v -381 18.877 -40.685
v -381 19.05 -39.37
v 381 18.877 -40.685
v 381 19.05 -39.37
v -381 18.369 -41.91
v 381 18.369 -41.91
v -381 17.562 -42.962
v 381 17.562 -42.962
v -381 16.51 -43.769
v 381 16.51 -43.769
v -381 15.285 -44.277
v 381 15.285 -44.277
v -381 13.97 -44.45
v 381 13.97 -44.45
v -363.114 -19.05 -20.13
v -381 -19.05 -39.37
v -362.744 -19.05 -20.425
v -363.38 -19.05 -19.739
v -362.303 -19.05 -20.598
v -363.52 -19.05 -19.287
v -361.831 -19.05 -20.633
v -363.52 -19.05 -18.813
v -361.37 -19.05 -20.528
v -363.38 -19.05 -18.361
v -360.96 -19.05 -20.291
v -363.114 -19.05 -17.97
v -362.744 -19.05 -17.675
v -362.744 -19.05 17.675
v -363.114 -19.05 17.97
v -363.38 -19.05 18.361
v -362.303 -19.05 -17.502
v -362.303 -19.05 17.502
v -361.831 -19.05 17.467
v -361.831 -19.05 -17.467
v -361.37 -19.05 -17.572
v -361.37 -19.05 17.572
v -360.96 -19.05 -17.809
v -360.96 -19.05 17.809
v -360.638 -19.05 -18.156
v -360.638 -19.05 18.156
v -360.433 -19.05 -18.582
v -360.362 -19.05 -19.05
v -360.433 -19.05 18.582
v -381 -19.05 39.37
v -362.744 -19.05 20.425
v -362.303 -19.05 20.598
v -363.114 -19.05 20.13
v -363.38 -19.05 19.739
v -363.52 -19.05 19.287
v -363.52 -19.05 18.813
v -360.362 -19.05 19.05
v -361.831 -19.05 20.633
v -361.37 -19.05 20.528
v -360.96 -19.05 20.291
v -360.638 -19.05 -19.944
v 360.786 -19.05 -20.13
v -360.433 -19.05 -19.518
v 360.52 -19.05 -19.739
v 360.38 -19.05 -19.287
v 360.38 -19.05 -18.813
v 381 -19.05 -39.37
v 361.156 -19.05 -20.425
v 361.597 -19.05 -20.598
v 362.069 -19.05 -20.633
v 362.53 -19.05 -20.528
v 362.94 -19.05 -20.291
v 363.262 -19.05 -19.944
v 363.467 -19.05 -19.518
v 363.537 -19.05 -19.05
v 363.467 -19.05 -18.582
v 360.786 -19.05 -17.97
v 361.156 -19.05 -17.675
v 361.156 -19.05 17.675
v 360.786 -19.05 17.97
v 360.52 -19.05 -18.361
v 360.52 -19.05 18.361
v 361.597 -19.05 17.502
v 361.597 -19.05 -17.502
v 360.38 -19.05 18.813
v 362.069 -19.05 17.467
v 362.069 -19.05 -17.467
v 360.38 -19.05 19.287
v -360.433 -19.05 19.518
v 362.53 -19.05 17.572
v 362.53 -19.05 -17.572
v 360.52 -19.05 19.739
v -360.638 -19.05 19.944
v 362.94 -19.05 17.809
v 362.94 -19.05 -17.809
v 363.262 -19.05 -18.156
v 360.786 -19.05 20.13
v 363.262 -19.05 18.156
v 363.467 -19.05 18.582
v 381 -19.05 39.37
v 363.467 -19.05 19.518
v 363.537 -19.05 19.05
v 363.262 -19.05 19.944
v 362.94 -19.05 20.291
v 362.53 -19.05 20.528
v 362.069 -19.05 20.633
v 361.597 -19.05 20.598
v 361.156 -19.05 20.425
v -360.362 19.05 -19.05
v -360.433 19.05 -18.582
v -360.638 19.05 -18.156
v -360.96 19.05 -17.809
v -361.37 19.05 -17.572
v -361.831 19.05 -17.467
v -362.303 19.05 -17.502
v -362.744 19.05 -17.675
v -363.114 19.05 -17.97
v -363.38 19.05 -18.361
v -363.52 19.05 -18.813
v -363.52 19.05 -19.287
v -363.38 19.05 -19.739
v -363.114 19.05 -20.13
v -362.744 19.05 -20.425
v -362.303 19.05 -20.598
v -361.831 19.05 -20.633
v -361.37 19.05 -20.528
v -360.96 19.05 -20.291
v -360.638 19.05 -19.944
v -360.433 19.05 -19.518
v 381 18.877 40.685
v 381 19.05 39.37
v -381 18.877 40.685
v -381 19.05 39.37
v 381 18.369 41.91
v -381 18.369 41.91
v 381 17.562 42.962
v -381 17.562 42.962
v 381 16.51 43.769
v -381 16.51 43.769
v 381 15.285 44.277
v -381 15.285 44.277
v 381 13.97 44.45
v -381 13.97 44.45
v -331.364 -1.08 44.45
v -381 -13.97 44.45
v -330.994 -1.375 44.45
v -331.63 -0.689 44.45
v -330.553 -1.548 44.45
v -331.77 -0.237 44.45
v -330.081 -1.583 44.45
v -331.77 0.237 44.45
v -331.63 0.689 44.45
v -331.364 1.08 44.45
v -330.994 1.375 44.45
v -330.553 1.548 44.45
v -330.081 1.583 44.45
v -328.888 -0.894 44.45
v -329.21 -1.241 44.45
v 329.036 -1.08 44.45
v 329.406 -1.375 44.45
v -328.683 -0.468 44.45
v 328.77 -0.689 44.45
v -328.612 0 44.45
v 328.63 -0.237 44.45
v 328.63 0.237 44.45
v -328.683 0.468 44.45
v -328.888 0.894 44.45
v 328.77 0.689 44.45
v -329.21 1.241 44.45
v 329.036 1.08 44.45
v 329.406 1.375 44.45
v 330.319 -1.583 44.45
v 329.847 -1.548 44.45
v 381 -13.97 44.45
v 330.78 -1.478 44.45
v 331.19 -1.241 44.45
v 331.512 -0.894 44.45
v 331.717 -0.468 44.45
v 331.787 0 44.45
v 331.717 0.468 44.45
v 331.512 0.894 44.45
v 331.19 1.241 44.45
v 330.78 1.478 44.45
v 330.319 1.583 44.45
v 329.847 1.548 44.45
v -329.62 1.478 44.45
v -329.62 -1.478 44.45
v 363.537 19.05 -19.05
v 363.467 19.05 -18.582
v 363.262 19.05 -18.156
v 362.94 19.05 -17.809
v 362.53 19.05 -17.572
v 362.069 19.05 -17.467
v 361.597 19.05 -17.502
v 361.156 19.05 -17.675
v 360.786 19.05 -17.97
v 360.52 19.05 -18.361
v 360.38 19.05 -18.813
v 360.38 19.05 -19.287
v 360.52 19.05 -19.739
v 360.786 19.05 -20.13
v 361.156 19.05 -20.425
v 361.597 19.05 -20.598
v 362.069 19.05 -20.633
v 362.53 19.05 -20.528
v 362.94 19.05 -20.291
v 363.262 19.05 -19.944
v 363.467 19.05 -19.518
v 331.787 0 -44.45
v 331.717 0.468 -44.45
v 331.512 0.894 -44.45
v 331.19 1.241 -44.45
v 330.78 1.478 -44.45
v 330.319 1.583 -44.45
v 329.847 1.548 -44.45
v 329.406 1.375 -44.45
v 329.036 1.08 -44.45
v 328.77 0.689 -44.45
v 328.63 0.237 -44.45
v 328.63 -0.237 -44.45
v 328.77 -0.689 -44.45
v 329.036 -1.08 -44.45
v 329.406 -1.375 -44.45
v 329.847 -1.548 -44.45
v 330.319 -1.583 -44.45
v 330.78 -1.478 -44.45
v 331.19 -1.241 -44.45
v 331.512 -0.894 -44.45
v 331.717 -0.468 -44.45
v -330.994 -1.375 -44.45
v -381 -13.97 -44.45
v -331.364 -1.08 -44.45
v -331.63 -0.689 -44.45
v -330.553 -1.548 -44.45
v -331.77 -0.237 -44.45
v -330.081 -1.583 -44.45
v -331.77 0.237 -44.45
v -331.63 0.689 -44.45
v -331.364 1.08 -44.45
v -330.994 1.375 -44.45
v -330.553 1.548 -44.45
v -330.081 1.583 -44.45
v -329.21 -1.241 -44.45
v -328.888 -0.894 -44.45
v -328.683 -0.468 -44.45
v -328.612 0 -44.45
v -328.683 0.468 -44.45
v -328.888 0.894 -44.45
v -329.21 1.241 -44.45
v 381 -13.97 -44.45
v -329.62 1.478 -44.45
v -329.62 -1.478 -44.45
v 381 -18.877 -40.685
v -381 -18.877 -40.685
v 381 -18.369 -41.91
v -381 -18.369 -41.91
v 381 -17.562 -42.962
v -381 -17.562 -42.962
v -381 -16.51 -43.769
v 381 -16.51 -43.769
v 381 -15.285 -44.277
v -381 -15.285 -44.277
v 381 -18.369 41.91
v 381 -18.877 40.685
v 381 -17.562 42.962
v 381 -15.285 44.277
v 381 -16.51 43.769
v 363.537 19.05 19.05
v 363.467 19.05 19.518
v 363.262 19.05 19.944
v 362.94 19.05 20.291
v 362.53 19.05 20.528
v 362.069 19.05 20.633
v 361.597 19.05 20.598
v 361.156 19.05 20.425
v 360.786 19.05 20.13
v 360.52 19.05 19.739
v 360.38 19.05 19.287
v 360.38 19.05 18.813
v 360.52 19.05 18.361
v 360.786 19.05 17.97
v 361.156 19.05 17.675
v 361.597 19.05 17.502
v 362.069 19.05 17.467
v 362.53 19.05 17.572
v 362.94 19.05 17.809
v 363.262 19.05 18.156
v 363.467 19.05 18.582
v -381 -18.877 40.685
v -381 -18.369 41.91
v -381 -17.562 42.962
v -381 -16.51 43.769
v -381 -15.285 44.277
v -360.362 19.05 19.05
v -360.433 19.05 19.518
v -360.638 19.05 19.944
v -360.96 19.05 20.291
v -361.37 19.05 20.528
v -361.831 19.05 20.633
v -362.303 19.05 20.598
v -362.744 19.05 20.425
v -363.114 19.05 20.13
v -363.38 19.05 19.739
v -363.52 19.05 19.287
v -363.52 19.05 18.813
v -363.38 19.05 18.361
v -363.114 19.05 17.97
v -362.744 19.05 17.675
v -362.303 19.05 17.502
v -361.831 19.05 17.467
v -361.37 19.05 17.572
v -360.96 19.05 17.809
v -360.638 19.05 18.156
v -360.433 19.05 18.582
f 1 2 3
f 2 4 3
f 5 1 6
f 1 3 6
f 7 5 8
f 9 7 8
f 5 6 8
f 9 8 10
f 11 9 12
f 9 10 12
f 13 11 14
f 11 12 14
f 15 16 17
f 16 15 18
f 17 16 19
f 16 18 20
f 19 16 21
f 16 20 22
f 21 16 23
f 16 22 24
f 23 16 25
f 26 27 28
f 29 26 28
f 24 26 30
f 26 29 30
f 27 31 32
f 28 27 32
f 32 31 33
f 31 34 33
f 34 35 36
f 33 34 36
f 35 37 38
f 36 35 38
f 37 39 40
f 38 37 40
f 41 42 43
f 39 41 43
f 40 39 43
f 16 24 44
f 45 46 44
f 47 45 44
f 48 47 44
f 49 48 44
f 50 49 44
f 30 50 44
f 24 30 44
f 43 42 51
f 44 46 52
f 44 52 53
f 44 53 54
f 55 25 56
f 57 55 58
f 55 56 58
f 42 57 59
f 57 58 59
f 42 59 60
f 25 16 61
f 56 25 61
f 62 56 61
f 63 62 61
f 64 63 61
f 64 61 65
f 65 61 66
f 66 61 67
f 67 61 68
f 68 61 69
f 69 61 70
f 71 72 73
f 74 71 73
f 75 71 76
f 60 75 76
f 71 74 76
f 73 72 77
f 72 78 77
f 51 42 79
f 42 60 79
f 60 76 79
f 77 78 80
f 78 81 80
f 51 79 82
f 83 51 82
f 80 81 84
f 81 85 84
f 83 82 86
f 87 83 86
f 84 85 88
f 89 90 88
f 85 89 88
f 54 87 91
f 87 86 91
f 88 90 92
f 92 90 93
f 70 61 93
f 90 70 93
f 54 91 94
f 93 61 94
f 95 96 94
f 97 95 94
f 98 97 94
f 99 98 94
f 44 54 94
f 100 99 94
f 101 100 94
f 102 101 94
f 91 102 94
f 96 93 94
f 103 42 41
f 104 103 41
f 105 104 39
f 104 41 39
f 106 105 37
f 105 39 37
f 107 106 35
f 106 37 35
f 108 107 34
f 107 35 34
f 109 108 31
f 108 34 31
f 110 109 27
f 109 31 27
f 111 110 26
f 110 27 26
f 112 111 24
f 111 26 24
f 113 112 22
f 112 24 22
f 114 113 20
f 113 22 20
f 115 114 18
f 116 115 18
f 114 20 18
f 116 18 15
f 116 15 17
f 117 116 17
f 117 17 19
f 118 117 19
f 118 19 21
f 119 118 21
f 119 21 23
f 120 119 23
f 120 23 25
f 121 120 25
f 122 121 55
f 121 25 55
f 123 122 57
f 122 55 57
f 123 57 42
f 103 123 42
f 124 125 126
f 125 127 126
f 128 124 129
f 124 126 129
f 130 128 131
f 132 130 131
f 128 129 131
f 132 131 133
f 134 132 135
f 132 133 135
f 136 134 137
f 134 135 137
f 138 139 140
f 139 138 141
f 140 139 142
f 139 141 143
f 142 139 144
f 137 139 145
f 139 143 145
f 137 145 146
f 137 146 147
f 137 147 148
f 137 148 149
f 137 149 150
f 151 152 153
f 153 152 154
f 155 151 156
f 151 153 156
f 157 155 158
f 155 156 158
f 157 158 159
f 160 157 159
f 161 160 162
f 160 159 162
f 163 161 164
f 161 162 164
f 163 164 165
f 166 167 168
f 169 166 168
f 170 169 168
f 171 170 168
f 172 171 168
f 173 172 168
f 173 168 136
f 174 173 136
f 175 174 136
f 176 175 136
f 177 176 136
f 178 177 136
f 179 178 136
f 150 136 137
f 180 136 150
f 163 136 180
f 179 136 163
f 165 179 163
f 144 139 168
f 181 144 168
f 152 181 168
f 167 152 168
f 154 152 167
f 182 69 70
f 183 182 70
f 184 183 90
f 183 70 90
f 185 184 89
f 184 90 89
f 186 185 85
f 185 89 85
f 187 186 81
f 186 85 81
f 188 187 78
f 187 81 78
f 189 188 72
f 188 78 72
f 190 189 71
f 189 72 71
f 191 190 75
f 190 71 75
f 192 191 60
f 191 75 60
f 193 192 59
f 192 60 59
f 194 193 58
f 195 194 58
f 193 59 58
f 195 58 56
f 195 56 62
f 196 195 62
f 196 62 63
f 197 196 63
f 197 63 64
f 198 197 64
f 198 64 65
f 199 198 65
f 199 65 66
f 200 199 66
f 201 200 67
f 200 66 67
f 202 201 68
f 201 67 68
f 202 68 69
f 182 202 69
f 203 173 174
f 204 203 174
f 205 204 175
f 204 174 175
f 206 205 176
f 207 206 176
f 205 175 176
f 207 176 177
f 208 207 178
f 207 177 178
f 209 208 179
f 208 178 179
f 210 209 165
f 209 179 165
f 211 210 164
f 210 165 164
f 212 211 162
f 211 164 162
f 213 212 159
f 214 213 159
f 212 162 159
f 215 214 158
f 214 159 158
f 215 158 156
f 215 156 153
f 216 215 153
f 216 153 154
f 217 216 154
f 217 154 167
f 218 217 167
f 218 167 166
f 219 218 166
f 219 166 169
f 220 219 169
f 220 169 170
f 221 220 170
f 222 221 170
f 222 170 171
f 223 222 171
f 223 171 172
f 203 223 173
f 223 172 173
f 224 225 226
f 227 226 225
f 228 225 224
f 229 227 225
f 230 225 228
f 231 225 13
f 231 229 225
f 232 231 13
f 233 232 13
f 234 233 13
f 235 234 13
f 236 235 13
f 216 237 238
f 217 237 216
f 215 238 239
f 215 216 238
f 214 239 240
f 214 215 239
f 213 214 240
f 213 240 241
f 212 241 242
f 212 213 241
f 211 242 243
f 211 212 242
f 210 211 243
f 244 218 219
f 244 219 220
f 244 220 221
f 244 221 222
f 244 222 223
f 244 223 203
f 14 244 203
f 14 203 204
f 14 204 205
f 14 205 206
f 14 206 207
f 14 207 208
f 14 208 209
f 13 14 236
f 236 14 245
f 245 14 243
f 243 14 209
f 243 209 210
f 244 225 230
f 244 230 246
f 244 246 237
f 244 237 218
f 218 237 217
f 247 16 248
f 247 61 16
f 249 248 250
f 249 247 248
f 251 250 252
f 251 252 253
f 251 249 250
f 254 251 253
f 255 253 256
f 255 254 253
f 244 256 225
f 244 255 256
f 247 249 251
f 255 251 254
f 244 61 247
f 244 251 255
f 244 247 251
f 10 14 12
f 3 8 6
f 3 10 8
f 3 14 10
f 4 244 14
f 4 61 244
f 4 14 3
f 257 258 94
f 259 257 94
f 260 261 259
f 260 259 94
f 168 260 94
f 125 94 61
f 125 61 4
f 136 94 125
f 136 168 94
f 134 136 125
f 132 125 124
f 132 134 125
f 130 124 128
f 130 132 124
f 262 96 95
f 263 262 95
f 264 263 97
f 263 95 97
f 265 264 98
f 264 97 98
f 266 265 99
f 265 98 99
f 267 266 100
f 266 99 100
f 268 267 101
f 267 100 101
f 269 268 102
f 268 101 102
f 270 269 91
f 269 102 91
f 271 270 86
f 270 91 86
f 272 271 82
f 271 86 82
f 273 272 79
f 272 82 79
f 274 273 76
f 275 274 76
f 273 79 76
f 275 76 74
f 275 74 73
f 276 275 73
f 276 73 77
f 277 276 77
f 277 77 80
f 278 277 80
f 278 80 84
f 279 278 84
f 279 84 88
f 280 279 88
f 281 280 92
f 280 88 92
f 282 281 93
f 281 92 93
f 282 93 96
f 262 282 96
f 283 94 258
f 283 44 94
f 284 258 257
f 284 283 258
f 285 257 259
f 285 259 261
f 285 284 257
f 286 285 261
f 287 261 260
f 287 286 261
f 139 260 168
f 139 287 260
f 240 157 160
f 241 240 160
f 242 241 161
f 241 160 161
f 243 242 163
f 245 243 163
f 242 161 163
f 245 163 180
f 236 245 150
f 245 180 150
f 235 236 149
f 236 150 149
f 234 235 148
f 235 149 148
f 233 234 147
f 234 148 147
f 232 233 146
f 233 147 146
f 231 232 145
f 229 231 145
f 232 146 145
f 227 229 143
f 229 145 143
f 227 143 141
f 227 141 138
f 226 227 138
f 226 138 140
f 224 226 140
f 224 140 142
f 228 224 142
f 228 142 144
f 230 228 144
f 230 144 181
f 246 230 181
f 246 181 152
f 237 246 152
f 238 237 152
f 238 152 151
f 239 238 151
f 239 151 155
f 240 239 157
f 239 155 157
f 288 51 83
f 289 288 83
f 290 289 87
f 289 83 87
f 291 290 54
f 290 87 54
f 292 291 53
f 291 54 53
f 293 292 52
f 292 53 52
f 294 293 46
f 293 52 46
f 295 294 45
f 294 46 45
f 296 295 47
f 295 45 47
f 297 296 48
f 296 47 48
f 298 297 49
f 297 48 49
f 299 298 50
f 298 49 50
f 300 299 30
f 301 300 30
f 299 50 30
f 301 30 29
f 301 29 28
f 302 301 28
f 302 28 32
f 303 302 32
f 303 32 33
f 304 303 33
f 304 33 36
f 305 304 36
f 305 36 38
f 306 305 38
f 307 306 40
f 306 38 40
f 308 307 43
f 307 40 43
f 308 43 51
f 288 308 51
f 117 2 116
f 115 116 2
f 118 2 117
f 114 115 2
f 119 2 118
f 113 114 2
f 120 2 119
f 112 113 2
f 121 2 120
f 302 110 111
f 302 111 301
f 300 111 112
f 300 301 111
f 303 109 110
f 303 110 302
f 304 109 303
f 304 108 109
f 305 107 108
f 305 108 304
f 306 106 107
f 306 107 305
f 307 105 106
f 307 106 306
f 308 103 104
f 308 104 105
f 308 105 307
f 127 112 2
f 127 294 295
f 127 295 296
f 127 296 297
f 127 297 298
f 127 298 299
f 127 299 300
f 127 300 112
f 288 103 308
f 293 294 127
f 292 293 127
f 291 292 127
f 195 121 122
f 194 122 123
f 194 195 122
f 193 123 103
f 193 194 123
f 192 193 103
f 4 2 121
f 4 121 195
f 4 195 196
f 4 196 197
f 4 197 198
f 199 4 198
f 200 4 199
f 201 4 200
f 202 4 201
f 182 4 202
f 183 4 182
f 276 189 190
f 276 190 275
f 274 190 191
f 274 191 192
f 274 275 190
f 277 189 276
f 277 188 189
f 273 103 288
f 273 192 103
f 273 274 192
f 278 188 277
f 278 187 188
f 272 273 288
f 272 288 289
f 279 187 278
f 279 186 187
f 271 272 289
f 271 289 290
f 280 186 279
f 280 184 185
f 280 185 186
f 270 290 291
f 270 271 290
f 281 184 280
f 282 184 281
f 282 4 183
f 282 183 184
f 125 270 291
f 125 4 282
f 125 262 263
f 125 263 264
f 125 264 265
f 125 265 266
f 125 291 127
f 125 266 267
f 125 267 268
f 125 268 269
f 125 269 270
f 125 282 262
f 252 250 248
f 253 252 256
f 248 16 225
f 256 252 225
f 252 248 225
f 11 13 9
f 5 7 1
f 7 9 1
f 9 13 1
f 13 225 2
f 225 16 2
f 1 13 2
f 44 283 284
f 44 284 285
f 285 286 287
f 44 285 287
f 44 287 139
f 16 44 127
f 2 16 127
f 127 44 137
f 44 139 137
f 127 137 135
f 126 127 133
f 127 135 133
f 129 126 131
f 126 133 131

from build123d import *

# Parameters (mm, degrees)
F0_W      = 38.1
F0_H      = 88.9
F1_DEPTH  = 381
F2_R      = 5.08
F3_R      = 1.5875
F4_DEPTH  = 88.9
F5_R      = 1.5875
F6_DEPTH  = 88.9
F7_R      = 1.5875
F8_R      = 1.5875
F9_R      = 1.5875
F10_R     = 1.5875
F11_DEPTH = 38.1


with BuildPart() as f1:
    # F0 (on Right) → F1 (new body, symmetric)
    with BuildSketch(Plane.YZ):
        Rectangle(F0_W, F0_H)
    extrude(amount=F1_DEPTH, both=True)

    # F2
    f2_edges = [f1.edges().sort_by_distance(p)[0] for p in [
        (0, -19.05, 44.45),
        (0, 19.05, 44.45),
        (0, -19.05, -44.45),
        (0, 19.05, -44.45),
    ]]
    fillet(f2_edges, radius=F2_R)

    # F3 (on face) → F4 (cut, through all)
    with BuildSketch(Plane.XY.offset(44.45)):
        with Locations((330.2, 0)):
            Circle(F3_R)
    extrude(amount=-F4_DEPTH, mode=Mode.SUBTRACT)

    # F5 (on face) → F6 (cut, through all)
    with BuildSketch(Plane.XY.offset(44.45)):
        with Locations((-330.2, 0)):
            Circle(F5_R)
    extrude(amount=-F6_DEPTH, mode=Mode.SUBTRACT)

    # F7 (on face) + F8 (on face) + F9 (on face) + F10 (on face) → F11 (cut, through all)
    with BuildSketch(Plane.XZ.offset(19.05)):
        with Locations((-361.95, 19.05)):
            Circle(F7_R)
    with BuildSketch(Plane.XZ.offset(19.05)):
        with Locations((-361.95, -19.05)):
            Circle(F8_R)
    with BuildSketch(Plane.XZ.offset(19.05)):
        with Locations((361.95, 19.05)):
            Circle(F9_R)
    with BuildSketch(Plane.XZ.offset(19.05)):
        with Locations((361.95, -19.05)):
            Circle(F10_R)
    extrude(amount=-F11_DEPTH, mode=Mode.SUBTRACT)


solid = f1.part
